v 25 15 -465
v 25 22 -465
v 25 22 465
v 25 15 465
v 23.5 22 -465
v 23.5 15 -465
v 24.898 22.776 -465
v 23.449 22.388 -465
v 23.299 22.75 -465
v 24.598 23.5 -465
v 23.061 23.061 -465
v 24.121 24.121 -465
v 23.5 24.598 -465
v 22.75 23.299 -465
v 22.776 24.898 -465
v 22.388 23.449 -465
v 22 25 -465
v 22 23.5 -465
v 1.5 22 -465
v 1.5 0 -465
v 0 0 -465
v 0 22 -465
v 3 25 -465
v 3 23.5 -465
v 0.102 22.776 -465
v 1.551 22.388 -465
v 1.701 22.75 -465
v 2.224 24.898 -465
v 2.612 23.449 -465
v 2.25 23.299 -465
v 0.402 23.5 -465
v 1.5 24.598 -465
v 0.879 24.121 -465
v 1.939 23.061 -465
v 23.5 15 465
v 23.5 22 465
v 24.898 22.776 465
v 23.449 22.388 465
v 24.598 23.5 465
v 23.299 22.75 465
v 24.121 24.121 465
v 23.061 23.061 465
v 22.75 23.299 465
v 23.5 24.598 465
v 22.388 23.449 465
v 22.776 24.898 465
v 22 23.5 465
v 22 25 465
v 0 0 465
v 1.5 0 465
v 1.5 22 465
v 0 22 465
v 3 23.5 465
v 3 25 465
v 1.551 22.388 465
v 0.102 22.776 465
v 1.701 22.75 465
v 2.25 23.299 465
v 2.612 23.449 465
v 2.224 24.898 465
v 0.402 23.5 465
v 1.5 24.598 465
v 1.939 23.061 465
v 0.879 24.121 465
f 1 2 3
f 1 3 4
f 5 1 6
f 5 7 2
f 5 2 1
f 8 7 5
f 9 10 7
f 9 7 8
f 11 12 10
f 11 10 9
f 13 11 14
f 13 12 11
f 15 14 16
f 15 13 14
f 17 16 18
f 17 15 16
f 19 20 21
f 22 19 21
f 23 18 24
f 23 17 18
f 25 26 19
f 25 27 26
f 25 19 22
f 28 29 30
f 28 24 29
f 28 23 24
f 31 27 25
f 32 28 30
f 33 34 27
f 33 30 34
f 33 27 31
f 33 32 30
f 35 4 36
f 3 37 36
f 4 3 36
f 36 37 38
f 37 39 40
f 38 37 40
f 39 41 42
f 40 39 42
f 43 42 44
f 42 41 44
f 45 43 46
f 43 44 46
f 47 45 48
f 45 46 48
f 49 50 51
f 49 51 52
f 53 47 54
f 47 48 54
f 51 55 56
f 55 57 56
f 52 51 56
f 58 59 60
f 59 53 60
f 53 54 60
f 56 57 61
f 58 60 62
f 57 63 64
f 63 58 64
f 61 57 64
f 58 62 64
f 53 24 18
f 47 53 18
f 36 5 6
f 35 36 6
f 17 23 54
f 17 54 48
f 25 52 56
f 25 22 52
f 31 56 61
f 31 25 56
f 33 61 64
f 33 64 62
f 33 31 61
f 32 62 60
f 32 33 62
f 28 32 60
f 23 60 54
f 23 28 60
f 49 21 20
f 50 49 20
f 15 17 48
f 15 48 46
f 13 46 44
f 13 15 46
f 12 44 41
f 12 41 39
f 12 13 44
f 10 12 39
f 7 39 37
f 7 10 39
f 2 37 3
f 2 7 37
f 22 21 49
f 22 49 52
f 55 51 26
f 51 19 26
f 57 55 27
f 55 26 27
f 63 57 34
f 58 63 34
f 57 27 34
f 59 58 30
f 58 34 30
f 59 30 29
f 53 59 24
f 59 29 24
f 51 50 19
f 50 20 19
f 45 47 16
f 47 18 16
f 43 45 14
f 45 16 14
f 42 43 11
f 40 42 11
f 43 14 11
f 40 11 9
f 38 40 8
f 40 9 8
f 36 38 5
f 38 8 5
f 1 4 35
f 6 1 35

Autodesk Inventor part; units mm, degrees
ref_plane "YZ Plane" through (0, 0, 0) normal (1, 0, 0) x (0, 1, 0)
ref_plane "XZ Plane" through (0, 0, 0) normal (0, 1, 0) x (-1, 0, 0)
ref_plane "XY Plane" through (0, 0, 0) normal (0, 0, 1) x (1, 0, 0)
sketch "Sketch1" plane through (0, 0, 0) normal (0, 0, 1) x (1, 0, 0)
  line L0 (0, 0) -> (0, 25)
  line L1 (0, 25) -> (25, 25)
  line L2 (25, 25) -> (25, 15)
  dimension "d0" = 25
  dimension "d1" = 25
  dimension "d2" = 10
contour flange "Contour Flange1" sketch "Sketch1" thickness 1.5 bend radius 1.5 width 930 along (0, 0, 1) mid plane yes both sides no wall seen from (0, 12.5, 0) lies toward (1, 0, 0) curves L0 L1 L2
bend "Bend1"
corner "Corner1"
equation "\"d3\" = BendReliefWidth"
equation "\"d4\" = BendReliefDepth"
equation "\"d5\" = MinimumRemnant"
equation "\"d6\" = BendRadius"
equation "\"d8\" = BendRadius"
equation "\"d10\" = CornerReliefSize"
equation "\"d11\" = GapSize"
equation "\"d12\" = JacobiRadiusSize"
equation "\"BendRadius\" = Thickness"
equation "\"BendReliefWidth\" = Thickness"
equation "\"BendReliefDepth\" = 0.5 * Thickness"
equation "\"CornerReliefSize\" = 4 * Thickness"
equation "\"MinimumRemnant\" = 2 * Thickness"
equation "\"TransitionRadius\" = BendRadius"
equation "\"JacobiRadiusSize\" = BendRadius"
equation "\"GapSize\" = Thickness"
equation "\"Thickness\" = 1.5"
properties part number "Perfil \"J\"" material "Stainless Steel"
